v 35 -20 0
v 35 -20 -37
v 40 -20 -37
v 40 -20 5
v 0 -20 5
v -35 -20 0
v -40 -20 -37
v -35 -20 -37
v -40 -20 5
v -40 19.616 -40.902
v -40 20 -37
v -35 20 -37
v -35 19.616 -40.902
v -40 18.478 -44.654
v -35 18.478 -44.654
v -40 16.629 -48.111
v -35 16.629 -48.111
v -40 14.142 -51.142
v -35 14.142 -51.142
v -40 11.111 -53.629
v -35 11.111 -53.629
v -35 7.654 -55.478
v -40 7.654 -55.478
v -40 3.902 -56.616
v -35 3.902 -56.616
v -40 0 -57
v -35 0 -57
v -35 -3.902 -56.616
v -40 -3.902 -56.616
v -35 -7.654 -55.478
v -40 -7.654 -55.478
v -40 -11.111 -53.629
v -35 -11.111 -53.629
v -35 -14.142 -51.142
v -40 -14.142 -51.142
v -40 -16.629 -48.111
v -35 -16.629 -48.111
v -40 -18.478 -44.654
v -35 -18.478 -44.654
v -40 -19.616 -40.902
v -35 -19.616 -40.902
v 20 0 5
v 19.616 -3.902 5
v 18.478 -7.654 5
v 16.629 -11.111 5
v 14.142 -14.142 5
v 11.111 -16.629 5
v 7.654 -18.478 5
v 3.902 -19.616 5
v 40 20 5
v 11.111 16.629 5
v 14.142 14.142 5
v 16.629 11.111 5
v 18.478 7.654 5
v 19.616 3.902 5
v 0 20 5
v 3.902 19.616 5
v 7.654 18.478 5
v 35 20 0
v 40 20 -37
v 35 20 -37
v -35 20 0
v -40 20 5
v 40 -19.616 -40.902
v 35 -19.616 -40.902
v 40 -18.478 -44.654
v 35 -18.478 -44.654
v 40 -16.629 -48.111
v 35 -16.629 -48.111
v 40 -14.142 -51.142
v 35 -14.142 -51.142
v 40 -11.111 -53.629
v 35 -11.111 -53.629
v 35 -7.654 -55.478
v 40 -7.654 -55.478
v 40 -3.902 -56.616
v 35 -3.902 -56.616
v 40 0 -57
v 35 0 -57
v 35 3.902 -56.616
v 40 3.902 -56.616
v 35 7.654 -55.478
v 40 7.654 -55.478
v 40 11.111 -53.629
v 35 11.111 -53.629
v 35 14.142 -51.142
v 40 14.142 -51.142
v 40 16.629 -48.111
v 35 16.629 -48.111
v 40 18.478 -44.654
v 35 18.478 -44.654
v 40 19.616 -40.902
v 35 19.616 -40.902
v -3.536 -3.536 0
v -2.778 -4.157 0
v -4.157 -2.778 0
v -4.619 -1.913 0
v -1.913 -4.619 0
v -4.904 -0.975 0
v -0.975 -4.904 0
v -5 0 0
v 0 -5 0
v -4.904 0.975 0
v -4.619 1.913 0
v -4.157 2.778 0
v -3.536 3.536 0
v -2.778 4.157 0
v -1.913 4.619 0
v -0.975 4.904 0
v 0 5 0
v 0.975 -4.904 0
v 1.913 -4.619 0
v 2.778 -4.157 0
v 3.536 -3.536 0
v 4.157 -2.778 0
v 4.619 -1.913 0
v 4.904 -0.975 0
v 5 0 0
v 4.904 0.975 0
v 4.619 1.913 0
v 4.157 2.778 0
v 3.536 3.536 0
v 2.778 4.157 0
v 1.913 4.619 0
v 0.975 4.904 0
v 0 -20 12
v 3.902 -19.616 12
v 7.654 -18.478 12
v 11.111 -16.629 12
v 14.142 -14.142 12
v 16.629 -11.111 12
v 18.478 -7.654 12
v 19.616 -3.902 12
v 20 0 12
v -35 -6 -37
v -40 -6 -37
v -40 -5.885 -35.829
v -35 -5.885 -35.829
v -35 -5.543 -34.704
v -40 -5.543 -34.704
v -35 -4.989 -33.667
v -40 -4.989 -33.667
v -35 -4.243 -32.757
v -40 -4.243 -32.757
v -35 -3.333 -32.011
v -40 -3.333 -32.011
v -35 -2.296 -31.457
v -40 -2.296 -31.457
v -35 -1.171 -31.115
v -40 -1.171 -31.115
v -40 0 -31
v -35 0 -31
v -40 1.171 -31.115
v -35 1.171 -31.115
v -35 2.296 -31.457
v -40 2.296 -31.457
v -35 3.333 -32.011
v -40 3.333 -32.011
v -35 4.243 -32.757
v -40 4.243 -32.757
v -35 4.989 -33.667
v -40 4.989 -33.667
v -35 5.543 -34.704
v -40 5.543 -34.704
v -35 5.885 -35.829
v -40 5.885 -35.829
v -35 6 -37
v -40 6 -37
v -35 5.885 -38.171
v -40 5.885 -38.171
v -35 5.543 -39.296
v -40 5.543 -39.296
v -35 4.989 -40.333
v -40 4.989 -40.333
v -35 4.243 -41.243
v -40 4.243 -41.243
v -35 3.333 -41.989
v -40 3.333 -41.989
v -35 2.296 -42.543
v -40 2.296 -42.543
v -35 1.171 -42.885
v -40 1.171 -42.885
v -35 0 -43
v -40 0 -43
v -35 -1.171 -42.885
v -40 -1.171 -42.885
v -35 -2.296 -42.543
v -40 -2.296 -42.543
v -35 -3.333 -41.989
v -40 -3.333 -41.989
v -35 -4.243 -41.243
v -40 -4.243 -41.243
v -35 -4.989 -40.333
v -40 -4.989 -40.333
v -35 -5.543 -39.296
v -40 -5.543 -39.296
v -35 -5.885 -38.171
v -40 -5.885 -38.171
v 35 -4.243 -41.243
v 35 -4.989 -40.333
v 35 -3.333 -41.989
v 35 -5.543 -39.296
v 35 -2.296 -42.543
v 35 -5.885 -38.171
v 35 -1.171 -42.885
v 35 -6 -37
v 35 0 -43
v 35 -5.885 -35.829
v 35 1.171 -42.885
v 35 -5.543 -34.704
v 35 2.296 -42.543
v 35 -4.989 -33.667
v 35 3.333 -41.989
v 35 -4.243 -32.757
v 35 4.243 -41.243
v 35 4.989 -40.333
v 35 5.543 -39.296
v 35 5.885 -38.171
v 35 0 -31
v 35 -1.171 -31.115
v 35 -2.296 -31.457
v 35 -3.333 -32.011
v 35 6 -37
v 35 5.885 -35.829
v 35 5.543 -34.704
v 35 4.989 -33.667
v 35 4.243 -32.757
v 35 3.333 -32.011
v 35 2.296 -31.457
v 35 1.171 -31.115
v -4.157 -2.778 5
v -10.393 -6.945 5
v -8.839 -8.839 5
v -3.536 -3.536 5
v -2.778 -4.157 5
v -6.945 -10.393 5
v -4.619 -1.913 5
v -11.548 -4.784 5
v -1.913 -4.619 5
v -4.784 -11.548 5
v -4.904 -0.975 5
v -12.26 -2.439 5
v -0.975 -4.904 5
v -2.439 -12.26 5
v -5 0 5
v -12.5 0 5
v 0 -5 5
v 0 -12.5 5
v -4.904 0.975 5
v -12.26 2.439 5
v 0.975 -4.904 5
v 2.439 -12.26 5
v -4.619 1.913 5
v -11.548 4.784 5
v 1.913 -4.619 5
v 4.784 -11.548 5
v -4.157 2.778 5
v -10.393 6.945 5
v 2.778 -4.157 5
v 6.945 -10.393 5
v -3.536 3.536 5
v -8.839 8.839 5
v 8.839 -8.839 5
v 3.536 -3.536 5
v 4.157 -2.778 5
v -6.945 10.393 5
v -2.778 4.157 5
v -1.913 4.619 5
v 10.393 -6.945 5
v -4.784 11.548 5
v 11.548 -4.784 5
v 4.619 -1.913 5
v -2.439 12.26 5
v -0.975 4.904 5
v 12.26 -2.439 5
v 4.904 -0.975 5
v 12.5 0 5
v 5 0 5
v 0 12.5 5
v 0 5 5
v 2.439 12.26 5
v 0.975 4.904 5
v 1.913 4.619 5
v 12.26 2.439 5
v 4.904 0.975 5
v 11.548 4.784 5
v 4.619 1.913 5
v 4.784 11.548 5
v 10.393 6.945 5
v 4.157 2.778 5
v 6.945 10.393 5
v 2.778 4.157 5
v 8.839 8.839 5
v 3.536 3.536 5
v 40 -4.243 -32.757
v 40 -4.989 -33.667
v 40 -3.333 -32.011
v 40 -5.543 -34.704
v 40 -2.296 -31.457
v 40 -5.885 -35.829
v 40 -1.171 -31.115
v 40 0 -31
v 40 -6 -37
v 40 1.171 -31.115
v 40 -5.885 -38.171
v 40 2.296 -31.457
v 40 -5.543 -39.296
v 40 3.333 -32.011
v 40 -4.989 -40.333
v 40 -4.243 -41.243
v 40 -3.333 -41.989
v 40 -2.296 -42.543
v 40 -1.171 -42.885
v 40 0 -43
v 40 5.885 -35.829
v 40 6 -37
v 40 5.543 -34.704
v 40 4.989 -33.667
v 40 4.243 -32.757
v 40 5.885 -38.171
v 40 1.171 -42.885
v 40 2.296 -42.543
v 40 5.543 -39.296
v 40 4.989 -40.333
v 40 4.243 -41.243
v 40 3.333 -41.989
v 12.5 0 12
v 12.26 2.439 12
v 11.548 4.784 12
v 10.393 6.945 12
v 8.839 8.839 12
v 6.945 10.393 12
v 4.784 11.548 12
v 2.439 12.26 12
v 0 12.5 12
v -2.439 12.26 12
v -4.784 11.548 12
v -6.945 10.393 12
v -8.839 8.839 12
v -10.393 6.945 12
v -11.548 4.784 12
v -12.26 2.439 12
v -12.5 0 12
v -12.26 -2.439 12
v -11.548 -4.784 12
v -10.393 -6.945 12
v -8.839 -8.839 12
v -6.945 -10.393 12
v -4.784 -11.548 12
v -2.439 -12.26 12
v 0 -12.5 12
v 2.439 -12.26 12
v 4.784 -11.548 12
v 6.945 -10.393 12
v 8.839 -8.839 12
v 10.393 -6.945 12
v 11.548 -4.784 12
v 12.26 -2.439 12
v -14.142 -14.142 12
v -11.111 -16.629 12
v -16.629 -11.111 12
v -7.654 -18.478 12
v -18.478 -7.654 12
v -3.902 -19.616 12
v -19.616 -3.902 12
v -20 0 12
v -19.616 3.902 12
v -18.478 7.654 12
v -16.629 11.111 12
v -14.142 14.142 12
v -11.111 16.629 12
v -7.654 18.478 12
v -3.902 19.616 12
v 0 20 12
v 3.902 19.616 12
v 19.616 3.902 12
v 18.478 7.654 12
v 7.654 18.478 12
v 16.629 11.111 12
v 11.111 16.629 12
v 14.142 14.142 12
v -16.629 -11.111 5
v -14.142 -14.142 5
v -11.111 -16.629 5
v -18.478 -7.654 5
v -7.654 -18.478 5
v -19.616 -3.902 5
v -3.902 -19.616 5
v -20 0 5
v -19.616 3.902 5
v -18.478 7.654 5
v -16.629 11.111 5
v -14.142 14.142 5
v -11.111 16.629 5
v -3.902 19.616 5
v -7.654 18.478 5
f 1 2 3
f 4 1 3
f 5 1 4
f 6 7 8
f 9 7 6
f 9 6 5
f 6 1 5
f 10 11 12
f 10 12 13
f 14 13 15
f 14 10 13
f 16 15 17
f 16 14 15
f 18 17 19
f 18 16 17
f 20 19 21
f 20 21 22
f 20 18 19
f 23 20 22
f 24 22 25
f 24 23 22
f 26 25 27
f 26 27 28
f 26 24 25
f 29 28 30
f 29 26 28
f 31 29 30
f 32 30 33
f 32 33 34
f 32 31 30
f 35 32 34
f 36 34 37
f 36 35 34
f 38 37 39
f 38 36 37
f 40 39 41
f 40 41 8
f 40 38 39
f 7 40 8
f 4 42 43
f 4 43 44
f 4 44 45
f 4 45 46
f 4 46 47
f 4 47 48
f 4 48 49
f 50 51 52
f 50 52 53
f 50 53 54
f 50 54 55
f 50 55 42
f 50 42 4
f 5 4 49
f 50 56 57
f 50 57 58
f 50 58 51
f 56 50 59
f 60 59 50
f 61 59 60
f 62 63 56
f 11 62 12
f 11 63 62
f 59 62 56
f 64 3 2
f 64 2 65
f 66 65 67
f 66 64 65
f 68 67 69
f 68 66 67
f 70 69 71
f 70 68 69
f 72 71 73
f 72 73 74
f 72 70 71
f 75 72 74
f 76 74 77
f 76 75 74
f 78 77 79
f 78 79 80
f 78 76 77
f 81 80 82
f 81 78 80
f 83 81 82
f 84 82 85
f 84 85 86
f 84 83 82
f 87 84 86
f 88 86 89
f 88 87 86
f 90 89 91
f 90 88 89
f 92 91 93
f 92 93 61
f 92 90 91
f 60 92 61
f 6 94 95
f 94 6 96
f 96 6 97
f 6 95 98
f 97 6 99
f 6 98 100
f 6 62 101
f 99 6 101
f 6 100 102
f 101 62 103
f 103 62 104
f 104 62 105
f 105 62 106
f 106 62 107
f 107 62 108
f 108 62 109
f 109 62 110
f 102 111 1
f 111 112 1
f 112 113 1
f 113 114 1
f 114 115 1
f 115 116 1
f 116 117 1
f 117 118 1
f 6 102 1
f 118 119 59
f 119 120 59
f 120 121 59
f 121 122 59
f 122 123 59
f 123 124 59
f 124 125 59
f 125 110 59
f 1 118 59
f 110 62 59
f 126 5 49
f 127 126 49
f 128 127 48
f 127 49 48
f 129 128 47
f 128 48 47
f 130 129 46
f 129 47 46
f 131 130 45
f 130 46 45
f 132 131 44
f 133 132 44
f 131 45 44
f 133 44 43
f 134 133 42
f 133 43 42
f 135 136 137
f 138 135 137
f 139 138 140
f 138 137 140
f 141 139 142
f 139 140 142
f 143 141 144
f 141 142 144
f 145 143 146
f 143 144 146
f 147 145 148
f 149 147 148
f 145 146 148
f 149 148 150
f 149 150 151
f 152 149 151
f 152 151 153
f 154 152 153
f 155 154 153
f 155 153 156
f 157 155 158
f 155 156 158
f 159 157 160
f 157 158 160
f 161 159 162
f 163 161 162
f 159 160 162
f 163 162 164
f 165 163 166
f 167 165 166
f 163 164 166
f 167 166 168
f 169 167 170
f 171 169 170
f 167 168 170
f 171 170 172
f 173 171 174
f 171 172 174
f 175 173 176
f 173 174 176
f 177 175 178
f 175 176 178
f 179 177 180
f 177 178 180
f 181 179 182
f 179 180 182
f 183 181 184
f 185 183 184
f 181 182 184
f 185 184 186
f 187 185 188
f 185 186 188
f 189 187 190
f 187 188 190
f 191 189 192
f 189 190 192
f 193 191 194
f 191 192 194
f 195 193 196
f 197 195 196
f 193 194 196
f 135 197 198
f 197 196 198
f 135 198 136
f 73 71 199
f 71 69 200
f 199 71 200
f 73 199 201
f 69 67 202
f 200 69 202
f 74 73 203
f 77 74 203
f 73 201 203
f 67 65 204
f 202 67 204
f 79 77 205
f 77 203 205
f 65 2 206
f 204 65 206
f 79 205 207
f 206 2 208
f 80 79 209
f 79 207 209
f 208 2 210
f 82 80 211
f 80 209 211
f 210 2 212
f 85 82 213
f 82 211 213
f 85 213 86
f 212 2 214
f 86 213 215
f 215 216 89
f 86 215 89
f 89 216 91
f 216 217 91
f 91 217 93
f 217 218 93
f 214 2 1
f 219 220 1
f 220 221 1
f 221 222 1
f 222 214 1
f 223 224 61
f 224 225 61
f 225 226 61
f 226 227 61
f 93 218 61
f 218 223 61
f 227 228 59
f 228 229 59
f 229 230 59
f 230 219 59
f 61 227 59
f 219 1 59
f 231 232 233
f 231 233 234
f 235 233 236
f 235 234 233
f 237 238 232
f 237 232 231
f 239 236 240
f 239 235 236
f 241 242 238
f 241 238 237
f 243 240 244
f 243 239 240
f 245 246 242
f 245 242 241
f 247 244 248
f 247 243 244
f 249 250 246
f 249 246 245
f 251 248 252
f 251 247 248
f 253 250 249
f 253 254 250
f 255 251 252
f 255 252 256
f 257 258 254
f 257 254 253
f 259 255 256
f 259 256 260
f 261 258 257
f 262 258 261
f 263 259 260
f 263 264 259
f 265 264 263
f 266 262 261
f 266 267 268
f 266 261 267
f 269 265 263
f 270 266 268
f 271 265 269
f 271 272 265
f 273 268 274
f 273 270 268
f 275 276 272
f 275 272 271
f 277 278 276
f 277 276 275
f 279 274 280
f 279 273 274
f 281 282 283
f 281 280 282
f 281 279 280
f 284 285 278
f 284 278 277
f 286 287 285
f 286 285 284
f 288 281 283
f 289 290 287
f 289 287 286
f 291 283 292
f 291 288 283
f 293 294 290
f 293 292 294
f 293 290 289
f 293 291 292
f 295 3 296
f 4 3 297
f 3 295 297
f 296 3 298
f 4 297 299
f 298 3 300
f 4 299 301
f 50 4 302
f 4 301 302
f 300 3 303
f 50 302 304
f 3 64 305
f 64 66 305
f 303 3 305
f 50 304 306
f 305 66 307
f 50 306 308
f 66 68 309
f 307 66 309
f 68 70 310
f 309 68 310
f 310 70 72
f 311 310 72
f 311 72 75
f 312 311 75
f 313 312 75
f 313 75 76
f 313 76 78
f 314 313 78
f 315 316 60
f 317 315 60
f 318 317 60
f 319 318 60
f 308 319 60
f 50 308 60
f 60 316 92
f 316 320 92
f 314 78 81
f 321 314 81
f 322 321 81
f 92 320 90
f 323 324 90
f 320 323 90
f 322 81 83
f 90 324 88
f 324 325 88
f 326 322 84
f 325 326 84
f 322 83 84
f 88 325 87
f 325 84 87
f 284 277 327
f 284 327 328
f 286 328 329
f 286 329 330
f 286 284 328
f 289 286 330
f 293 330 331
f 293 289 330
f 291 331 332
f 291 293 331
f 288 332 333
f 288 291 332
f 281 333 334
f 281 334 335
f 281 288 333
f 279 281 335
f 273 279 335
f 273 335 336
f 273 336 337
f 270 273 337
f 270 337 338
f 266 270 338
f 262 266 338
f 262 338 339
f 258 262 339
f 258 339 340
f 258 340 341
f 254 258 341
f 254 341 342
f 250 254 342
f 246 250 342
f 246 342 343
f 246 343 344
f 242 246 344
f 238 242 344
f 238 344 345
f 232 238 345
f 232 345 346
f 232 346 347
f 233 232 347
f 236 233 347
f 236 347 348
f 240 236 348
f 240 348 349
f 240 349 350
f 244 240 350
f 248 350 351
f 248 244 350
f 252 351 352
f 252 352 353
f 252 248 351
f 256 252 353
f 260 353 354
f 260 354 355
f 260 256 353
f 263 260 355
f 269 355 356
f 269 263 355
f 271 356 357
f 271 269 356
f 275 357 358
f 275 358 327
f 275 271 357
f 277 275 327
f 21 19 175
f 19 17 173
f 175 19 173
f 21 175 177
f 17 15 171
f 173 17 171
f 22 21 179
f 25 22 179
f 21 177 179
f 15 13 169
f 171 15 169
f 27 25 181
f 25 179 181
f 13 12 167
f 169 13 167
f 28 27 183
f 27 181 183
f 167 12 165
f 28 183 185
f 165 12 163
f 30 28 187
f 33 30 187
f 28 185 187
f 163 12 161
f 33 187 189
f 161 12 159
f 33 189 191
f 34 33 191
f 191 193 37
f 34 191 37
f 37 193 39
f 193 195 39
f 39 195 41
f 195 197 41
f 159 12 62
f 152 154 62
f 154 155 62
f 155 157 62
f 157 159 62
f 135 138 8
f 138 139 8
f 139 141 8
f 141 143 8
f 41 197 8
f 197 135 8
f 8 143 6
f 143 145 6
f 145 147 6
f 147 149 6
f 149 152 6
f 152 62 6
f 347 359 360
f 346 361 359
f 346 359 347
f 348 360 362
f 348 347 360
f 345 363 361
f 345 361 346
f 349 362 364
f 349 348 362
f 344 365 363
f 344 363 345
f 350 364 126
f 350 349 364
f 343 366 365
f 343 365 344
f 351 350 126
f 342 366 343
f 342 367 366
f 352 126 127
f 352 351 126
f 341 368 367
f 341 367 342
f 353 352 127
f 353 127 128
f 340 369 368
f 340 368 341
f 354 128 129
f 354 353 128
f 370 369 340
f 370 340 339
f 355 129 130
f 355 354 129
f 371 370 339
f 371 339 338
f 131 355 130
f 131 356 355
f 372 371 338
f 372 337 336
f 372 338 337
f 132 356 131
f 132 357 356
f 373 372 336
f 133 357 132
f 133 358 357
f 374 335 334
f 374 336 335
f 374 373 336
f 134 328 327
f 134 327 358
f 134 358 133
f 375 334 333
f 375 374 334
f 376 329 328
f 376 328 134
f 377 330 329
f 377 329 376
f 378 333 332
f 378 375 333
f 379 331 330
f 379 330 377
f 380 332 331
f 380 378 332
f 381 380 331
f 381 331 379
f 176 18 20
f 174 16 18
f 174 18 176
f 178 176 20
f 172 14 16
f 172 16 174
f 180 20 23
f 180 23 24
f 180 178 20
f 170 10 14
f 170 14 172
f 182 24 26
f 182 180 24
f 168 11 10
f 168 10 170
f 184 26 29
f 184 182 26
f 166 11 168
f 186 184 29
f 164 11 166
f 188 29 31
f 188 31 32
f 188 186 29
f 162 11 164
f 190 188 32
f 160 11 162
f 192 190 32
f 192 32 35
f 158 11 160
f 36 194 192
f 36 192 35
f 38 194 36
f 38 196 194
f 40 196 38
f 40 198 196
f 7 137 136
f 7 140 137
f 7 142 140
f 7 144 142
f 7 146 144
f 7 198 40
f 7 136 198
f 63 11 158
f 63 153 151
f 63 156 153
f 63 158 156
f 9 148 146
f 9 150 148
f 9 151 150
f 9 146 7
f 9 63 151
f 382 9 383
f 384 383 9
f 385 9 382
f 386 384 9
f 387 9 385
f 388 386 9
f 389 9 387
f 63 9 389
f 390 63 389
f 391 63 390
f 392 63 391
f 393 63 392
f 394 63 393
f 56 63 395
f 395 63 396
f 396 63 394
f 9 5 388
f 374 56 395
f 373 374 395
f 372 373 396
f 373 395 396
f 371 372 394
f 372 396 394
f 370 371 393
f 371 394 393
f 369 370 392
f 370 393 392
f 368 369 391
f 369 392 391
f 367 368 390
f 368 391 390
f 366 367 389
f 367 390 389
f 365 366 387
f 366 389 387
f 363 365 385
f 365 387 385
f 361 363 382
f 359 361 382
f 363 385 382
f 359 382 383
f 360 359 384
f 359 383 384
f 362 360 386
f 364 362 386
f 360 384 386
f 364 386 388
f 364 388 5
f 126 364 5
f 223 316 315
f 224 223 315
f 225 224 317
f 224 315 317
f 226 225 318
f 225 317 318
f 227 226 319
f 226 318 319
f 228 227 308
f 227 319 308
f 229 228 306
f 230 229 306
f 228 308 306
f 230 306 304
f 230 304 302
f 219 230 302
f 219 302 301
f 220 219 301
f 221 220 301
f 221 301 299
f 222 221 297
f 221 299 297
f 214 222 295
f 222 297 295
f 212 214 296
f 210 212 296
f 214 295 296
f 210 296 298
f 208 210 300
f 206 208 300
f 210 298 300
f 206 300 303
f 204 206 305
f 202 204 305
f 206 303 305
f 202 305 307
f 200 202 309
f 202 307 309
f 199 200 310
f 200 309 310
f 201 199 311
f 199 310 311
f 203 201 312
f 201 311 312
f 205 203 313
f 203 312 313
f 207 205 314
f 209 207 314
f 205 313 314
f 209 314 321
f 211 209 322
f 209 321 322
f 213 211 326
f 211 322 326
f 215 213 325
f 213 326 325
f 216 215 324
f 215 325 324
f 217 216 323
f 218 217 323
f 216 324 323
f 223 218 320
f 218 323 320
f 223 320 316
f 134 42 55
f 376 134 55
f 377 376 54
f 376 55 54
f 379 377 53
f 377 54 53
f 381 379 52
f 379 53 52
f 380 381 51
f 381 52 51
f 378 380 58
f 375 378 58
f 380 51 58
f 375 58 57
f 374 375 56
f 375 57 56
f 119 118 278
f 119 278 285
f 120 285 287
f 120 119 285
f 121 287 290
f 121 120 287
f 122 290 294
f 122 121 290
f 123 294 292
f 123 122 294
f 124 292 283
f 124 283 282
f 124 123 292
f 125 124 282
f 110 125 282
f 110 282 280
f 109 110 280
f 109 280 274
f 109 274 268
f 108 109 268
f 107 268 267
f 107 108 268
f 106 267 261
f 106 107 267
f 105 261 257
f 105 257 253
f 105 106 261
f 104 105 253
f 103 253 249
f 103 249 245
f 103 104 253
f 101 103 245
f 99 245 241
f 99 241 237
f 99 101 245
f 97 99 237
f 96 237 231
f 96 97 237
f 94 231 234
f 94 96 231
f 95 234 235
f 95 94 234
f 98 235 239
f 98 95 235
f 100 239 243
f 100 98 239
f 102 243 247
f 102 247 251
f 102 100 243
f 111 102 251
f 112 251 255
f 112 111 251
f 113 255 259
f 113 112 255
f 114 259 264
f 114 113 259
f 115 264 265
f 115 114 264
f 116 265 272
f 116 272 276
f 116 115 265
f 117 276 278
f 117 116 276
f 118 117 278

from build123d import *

# Parameters (mm, degrees)
F0_W     = 5
F0_H     = 40
F1_DEPTH = 5
F0_R     = 12.5
F2_DEPTH = 12
F0_R_2   = 5
F3_DEPTH = 5
F4_R     = 6
F5_DEPTH = 5
F6_R     = 6
F7_DEPTH = 5


with BuildPart() as f1:
    # F0 (on Top) → F1 (new body)
    with BuildSketch(Plane.XY):
        with Locations((37.5, 0)):
            Rectangle(F0_W, F0_H)
        with BuildLine():
            Line((0, -20), (35, -20))
            Line((35, -20), (35, 20))
            Line((35, 20), (0, 20))
            ThreePointArc((0, 20), (14.142136, 14.142136), (20, 0))
            ThreePointArc((20, 0), (14.142136, -14.142136), (0, -20))
        make_face()
        with BuildLine():
            Line((-35, -20), (0, -20))
            ThreePointArc((0, -20), (-20, 0), (0, 20))
            Line((0, 20), (-35, 20))
            Line((-35, 20), (-35, -20))
        make_face()
        with Locations((-37.5, 0)):
            Rectangle(F0_W, F0_H)
    extrude(amount=F1_DEPTH)

    # F0 (on Top) → F2 (join)
    with BuildSketch(Plane.XY):
        with BuildLine():
            ThreePointArc((0, 20), (-20, 0), (0, -20))
            ThreePointArc((0, -20), (14.142136, -14.142136), (20, 0))
            ThreePointArc((20, 0), (14.142136, 14.142136), (0, 20))
        make_face()
        Circle(F0_R, mode=Mode.SUBTRACT)
    extrude(amount=F2_DEPTH)

    # F0 (on Top) → F3 (join)
    with BuildSketch(Plane.XY):
        Circle(F0_R)
        Circle(F0_R_2, mode=Mode.SUBTRACT)
    extrude(amount=F3_DEPTH)

    # F4 (on face) → F5 (join)
    with BuildSketch(Plane(origin=(-40, 0, 0), x_dir=(0, -1, 0), z_dir=(-1, 0, 0))):
        with BuildLine():
            Line((20, 0), (-20, 0))
            Line((-20, 0), (-20, -37))
            ThreePointArc((-20, -37), (0, -57), (20, -37))
            Line((20, -37), (20, 0))
        make_face()
        with Locations((0, -37)):
            Circle(F4_R, mode=Mode.SUBTRACT)
    extrude(amount=-F5_DEPTH)

    # F6 (on face) → F7 (join)
    with BuildSketch(Plane.YZ.offset(40)):
        with BuildLine():
            Line((-20, 5), (-20, 0))
            Line((-20, 0), (-20, -37))
            ThreePointArc((-20, -37), (0, -57), (20, -37))
            Line((20, -37), (20, 0))
            Line((20, 0), (20, 5))
            Line((20, 5), (-20, 5))
        make_face()
        with Locations((0, -37)):
            Circle(F6_R, mode=Mode.SUBTRACT)
    extrude(amount=-F7_DEPTH)


solid = f1.part
